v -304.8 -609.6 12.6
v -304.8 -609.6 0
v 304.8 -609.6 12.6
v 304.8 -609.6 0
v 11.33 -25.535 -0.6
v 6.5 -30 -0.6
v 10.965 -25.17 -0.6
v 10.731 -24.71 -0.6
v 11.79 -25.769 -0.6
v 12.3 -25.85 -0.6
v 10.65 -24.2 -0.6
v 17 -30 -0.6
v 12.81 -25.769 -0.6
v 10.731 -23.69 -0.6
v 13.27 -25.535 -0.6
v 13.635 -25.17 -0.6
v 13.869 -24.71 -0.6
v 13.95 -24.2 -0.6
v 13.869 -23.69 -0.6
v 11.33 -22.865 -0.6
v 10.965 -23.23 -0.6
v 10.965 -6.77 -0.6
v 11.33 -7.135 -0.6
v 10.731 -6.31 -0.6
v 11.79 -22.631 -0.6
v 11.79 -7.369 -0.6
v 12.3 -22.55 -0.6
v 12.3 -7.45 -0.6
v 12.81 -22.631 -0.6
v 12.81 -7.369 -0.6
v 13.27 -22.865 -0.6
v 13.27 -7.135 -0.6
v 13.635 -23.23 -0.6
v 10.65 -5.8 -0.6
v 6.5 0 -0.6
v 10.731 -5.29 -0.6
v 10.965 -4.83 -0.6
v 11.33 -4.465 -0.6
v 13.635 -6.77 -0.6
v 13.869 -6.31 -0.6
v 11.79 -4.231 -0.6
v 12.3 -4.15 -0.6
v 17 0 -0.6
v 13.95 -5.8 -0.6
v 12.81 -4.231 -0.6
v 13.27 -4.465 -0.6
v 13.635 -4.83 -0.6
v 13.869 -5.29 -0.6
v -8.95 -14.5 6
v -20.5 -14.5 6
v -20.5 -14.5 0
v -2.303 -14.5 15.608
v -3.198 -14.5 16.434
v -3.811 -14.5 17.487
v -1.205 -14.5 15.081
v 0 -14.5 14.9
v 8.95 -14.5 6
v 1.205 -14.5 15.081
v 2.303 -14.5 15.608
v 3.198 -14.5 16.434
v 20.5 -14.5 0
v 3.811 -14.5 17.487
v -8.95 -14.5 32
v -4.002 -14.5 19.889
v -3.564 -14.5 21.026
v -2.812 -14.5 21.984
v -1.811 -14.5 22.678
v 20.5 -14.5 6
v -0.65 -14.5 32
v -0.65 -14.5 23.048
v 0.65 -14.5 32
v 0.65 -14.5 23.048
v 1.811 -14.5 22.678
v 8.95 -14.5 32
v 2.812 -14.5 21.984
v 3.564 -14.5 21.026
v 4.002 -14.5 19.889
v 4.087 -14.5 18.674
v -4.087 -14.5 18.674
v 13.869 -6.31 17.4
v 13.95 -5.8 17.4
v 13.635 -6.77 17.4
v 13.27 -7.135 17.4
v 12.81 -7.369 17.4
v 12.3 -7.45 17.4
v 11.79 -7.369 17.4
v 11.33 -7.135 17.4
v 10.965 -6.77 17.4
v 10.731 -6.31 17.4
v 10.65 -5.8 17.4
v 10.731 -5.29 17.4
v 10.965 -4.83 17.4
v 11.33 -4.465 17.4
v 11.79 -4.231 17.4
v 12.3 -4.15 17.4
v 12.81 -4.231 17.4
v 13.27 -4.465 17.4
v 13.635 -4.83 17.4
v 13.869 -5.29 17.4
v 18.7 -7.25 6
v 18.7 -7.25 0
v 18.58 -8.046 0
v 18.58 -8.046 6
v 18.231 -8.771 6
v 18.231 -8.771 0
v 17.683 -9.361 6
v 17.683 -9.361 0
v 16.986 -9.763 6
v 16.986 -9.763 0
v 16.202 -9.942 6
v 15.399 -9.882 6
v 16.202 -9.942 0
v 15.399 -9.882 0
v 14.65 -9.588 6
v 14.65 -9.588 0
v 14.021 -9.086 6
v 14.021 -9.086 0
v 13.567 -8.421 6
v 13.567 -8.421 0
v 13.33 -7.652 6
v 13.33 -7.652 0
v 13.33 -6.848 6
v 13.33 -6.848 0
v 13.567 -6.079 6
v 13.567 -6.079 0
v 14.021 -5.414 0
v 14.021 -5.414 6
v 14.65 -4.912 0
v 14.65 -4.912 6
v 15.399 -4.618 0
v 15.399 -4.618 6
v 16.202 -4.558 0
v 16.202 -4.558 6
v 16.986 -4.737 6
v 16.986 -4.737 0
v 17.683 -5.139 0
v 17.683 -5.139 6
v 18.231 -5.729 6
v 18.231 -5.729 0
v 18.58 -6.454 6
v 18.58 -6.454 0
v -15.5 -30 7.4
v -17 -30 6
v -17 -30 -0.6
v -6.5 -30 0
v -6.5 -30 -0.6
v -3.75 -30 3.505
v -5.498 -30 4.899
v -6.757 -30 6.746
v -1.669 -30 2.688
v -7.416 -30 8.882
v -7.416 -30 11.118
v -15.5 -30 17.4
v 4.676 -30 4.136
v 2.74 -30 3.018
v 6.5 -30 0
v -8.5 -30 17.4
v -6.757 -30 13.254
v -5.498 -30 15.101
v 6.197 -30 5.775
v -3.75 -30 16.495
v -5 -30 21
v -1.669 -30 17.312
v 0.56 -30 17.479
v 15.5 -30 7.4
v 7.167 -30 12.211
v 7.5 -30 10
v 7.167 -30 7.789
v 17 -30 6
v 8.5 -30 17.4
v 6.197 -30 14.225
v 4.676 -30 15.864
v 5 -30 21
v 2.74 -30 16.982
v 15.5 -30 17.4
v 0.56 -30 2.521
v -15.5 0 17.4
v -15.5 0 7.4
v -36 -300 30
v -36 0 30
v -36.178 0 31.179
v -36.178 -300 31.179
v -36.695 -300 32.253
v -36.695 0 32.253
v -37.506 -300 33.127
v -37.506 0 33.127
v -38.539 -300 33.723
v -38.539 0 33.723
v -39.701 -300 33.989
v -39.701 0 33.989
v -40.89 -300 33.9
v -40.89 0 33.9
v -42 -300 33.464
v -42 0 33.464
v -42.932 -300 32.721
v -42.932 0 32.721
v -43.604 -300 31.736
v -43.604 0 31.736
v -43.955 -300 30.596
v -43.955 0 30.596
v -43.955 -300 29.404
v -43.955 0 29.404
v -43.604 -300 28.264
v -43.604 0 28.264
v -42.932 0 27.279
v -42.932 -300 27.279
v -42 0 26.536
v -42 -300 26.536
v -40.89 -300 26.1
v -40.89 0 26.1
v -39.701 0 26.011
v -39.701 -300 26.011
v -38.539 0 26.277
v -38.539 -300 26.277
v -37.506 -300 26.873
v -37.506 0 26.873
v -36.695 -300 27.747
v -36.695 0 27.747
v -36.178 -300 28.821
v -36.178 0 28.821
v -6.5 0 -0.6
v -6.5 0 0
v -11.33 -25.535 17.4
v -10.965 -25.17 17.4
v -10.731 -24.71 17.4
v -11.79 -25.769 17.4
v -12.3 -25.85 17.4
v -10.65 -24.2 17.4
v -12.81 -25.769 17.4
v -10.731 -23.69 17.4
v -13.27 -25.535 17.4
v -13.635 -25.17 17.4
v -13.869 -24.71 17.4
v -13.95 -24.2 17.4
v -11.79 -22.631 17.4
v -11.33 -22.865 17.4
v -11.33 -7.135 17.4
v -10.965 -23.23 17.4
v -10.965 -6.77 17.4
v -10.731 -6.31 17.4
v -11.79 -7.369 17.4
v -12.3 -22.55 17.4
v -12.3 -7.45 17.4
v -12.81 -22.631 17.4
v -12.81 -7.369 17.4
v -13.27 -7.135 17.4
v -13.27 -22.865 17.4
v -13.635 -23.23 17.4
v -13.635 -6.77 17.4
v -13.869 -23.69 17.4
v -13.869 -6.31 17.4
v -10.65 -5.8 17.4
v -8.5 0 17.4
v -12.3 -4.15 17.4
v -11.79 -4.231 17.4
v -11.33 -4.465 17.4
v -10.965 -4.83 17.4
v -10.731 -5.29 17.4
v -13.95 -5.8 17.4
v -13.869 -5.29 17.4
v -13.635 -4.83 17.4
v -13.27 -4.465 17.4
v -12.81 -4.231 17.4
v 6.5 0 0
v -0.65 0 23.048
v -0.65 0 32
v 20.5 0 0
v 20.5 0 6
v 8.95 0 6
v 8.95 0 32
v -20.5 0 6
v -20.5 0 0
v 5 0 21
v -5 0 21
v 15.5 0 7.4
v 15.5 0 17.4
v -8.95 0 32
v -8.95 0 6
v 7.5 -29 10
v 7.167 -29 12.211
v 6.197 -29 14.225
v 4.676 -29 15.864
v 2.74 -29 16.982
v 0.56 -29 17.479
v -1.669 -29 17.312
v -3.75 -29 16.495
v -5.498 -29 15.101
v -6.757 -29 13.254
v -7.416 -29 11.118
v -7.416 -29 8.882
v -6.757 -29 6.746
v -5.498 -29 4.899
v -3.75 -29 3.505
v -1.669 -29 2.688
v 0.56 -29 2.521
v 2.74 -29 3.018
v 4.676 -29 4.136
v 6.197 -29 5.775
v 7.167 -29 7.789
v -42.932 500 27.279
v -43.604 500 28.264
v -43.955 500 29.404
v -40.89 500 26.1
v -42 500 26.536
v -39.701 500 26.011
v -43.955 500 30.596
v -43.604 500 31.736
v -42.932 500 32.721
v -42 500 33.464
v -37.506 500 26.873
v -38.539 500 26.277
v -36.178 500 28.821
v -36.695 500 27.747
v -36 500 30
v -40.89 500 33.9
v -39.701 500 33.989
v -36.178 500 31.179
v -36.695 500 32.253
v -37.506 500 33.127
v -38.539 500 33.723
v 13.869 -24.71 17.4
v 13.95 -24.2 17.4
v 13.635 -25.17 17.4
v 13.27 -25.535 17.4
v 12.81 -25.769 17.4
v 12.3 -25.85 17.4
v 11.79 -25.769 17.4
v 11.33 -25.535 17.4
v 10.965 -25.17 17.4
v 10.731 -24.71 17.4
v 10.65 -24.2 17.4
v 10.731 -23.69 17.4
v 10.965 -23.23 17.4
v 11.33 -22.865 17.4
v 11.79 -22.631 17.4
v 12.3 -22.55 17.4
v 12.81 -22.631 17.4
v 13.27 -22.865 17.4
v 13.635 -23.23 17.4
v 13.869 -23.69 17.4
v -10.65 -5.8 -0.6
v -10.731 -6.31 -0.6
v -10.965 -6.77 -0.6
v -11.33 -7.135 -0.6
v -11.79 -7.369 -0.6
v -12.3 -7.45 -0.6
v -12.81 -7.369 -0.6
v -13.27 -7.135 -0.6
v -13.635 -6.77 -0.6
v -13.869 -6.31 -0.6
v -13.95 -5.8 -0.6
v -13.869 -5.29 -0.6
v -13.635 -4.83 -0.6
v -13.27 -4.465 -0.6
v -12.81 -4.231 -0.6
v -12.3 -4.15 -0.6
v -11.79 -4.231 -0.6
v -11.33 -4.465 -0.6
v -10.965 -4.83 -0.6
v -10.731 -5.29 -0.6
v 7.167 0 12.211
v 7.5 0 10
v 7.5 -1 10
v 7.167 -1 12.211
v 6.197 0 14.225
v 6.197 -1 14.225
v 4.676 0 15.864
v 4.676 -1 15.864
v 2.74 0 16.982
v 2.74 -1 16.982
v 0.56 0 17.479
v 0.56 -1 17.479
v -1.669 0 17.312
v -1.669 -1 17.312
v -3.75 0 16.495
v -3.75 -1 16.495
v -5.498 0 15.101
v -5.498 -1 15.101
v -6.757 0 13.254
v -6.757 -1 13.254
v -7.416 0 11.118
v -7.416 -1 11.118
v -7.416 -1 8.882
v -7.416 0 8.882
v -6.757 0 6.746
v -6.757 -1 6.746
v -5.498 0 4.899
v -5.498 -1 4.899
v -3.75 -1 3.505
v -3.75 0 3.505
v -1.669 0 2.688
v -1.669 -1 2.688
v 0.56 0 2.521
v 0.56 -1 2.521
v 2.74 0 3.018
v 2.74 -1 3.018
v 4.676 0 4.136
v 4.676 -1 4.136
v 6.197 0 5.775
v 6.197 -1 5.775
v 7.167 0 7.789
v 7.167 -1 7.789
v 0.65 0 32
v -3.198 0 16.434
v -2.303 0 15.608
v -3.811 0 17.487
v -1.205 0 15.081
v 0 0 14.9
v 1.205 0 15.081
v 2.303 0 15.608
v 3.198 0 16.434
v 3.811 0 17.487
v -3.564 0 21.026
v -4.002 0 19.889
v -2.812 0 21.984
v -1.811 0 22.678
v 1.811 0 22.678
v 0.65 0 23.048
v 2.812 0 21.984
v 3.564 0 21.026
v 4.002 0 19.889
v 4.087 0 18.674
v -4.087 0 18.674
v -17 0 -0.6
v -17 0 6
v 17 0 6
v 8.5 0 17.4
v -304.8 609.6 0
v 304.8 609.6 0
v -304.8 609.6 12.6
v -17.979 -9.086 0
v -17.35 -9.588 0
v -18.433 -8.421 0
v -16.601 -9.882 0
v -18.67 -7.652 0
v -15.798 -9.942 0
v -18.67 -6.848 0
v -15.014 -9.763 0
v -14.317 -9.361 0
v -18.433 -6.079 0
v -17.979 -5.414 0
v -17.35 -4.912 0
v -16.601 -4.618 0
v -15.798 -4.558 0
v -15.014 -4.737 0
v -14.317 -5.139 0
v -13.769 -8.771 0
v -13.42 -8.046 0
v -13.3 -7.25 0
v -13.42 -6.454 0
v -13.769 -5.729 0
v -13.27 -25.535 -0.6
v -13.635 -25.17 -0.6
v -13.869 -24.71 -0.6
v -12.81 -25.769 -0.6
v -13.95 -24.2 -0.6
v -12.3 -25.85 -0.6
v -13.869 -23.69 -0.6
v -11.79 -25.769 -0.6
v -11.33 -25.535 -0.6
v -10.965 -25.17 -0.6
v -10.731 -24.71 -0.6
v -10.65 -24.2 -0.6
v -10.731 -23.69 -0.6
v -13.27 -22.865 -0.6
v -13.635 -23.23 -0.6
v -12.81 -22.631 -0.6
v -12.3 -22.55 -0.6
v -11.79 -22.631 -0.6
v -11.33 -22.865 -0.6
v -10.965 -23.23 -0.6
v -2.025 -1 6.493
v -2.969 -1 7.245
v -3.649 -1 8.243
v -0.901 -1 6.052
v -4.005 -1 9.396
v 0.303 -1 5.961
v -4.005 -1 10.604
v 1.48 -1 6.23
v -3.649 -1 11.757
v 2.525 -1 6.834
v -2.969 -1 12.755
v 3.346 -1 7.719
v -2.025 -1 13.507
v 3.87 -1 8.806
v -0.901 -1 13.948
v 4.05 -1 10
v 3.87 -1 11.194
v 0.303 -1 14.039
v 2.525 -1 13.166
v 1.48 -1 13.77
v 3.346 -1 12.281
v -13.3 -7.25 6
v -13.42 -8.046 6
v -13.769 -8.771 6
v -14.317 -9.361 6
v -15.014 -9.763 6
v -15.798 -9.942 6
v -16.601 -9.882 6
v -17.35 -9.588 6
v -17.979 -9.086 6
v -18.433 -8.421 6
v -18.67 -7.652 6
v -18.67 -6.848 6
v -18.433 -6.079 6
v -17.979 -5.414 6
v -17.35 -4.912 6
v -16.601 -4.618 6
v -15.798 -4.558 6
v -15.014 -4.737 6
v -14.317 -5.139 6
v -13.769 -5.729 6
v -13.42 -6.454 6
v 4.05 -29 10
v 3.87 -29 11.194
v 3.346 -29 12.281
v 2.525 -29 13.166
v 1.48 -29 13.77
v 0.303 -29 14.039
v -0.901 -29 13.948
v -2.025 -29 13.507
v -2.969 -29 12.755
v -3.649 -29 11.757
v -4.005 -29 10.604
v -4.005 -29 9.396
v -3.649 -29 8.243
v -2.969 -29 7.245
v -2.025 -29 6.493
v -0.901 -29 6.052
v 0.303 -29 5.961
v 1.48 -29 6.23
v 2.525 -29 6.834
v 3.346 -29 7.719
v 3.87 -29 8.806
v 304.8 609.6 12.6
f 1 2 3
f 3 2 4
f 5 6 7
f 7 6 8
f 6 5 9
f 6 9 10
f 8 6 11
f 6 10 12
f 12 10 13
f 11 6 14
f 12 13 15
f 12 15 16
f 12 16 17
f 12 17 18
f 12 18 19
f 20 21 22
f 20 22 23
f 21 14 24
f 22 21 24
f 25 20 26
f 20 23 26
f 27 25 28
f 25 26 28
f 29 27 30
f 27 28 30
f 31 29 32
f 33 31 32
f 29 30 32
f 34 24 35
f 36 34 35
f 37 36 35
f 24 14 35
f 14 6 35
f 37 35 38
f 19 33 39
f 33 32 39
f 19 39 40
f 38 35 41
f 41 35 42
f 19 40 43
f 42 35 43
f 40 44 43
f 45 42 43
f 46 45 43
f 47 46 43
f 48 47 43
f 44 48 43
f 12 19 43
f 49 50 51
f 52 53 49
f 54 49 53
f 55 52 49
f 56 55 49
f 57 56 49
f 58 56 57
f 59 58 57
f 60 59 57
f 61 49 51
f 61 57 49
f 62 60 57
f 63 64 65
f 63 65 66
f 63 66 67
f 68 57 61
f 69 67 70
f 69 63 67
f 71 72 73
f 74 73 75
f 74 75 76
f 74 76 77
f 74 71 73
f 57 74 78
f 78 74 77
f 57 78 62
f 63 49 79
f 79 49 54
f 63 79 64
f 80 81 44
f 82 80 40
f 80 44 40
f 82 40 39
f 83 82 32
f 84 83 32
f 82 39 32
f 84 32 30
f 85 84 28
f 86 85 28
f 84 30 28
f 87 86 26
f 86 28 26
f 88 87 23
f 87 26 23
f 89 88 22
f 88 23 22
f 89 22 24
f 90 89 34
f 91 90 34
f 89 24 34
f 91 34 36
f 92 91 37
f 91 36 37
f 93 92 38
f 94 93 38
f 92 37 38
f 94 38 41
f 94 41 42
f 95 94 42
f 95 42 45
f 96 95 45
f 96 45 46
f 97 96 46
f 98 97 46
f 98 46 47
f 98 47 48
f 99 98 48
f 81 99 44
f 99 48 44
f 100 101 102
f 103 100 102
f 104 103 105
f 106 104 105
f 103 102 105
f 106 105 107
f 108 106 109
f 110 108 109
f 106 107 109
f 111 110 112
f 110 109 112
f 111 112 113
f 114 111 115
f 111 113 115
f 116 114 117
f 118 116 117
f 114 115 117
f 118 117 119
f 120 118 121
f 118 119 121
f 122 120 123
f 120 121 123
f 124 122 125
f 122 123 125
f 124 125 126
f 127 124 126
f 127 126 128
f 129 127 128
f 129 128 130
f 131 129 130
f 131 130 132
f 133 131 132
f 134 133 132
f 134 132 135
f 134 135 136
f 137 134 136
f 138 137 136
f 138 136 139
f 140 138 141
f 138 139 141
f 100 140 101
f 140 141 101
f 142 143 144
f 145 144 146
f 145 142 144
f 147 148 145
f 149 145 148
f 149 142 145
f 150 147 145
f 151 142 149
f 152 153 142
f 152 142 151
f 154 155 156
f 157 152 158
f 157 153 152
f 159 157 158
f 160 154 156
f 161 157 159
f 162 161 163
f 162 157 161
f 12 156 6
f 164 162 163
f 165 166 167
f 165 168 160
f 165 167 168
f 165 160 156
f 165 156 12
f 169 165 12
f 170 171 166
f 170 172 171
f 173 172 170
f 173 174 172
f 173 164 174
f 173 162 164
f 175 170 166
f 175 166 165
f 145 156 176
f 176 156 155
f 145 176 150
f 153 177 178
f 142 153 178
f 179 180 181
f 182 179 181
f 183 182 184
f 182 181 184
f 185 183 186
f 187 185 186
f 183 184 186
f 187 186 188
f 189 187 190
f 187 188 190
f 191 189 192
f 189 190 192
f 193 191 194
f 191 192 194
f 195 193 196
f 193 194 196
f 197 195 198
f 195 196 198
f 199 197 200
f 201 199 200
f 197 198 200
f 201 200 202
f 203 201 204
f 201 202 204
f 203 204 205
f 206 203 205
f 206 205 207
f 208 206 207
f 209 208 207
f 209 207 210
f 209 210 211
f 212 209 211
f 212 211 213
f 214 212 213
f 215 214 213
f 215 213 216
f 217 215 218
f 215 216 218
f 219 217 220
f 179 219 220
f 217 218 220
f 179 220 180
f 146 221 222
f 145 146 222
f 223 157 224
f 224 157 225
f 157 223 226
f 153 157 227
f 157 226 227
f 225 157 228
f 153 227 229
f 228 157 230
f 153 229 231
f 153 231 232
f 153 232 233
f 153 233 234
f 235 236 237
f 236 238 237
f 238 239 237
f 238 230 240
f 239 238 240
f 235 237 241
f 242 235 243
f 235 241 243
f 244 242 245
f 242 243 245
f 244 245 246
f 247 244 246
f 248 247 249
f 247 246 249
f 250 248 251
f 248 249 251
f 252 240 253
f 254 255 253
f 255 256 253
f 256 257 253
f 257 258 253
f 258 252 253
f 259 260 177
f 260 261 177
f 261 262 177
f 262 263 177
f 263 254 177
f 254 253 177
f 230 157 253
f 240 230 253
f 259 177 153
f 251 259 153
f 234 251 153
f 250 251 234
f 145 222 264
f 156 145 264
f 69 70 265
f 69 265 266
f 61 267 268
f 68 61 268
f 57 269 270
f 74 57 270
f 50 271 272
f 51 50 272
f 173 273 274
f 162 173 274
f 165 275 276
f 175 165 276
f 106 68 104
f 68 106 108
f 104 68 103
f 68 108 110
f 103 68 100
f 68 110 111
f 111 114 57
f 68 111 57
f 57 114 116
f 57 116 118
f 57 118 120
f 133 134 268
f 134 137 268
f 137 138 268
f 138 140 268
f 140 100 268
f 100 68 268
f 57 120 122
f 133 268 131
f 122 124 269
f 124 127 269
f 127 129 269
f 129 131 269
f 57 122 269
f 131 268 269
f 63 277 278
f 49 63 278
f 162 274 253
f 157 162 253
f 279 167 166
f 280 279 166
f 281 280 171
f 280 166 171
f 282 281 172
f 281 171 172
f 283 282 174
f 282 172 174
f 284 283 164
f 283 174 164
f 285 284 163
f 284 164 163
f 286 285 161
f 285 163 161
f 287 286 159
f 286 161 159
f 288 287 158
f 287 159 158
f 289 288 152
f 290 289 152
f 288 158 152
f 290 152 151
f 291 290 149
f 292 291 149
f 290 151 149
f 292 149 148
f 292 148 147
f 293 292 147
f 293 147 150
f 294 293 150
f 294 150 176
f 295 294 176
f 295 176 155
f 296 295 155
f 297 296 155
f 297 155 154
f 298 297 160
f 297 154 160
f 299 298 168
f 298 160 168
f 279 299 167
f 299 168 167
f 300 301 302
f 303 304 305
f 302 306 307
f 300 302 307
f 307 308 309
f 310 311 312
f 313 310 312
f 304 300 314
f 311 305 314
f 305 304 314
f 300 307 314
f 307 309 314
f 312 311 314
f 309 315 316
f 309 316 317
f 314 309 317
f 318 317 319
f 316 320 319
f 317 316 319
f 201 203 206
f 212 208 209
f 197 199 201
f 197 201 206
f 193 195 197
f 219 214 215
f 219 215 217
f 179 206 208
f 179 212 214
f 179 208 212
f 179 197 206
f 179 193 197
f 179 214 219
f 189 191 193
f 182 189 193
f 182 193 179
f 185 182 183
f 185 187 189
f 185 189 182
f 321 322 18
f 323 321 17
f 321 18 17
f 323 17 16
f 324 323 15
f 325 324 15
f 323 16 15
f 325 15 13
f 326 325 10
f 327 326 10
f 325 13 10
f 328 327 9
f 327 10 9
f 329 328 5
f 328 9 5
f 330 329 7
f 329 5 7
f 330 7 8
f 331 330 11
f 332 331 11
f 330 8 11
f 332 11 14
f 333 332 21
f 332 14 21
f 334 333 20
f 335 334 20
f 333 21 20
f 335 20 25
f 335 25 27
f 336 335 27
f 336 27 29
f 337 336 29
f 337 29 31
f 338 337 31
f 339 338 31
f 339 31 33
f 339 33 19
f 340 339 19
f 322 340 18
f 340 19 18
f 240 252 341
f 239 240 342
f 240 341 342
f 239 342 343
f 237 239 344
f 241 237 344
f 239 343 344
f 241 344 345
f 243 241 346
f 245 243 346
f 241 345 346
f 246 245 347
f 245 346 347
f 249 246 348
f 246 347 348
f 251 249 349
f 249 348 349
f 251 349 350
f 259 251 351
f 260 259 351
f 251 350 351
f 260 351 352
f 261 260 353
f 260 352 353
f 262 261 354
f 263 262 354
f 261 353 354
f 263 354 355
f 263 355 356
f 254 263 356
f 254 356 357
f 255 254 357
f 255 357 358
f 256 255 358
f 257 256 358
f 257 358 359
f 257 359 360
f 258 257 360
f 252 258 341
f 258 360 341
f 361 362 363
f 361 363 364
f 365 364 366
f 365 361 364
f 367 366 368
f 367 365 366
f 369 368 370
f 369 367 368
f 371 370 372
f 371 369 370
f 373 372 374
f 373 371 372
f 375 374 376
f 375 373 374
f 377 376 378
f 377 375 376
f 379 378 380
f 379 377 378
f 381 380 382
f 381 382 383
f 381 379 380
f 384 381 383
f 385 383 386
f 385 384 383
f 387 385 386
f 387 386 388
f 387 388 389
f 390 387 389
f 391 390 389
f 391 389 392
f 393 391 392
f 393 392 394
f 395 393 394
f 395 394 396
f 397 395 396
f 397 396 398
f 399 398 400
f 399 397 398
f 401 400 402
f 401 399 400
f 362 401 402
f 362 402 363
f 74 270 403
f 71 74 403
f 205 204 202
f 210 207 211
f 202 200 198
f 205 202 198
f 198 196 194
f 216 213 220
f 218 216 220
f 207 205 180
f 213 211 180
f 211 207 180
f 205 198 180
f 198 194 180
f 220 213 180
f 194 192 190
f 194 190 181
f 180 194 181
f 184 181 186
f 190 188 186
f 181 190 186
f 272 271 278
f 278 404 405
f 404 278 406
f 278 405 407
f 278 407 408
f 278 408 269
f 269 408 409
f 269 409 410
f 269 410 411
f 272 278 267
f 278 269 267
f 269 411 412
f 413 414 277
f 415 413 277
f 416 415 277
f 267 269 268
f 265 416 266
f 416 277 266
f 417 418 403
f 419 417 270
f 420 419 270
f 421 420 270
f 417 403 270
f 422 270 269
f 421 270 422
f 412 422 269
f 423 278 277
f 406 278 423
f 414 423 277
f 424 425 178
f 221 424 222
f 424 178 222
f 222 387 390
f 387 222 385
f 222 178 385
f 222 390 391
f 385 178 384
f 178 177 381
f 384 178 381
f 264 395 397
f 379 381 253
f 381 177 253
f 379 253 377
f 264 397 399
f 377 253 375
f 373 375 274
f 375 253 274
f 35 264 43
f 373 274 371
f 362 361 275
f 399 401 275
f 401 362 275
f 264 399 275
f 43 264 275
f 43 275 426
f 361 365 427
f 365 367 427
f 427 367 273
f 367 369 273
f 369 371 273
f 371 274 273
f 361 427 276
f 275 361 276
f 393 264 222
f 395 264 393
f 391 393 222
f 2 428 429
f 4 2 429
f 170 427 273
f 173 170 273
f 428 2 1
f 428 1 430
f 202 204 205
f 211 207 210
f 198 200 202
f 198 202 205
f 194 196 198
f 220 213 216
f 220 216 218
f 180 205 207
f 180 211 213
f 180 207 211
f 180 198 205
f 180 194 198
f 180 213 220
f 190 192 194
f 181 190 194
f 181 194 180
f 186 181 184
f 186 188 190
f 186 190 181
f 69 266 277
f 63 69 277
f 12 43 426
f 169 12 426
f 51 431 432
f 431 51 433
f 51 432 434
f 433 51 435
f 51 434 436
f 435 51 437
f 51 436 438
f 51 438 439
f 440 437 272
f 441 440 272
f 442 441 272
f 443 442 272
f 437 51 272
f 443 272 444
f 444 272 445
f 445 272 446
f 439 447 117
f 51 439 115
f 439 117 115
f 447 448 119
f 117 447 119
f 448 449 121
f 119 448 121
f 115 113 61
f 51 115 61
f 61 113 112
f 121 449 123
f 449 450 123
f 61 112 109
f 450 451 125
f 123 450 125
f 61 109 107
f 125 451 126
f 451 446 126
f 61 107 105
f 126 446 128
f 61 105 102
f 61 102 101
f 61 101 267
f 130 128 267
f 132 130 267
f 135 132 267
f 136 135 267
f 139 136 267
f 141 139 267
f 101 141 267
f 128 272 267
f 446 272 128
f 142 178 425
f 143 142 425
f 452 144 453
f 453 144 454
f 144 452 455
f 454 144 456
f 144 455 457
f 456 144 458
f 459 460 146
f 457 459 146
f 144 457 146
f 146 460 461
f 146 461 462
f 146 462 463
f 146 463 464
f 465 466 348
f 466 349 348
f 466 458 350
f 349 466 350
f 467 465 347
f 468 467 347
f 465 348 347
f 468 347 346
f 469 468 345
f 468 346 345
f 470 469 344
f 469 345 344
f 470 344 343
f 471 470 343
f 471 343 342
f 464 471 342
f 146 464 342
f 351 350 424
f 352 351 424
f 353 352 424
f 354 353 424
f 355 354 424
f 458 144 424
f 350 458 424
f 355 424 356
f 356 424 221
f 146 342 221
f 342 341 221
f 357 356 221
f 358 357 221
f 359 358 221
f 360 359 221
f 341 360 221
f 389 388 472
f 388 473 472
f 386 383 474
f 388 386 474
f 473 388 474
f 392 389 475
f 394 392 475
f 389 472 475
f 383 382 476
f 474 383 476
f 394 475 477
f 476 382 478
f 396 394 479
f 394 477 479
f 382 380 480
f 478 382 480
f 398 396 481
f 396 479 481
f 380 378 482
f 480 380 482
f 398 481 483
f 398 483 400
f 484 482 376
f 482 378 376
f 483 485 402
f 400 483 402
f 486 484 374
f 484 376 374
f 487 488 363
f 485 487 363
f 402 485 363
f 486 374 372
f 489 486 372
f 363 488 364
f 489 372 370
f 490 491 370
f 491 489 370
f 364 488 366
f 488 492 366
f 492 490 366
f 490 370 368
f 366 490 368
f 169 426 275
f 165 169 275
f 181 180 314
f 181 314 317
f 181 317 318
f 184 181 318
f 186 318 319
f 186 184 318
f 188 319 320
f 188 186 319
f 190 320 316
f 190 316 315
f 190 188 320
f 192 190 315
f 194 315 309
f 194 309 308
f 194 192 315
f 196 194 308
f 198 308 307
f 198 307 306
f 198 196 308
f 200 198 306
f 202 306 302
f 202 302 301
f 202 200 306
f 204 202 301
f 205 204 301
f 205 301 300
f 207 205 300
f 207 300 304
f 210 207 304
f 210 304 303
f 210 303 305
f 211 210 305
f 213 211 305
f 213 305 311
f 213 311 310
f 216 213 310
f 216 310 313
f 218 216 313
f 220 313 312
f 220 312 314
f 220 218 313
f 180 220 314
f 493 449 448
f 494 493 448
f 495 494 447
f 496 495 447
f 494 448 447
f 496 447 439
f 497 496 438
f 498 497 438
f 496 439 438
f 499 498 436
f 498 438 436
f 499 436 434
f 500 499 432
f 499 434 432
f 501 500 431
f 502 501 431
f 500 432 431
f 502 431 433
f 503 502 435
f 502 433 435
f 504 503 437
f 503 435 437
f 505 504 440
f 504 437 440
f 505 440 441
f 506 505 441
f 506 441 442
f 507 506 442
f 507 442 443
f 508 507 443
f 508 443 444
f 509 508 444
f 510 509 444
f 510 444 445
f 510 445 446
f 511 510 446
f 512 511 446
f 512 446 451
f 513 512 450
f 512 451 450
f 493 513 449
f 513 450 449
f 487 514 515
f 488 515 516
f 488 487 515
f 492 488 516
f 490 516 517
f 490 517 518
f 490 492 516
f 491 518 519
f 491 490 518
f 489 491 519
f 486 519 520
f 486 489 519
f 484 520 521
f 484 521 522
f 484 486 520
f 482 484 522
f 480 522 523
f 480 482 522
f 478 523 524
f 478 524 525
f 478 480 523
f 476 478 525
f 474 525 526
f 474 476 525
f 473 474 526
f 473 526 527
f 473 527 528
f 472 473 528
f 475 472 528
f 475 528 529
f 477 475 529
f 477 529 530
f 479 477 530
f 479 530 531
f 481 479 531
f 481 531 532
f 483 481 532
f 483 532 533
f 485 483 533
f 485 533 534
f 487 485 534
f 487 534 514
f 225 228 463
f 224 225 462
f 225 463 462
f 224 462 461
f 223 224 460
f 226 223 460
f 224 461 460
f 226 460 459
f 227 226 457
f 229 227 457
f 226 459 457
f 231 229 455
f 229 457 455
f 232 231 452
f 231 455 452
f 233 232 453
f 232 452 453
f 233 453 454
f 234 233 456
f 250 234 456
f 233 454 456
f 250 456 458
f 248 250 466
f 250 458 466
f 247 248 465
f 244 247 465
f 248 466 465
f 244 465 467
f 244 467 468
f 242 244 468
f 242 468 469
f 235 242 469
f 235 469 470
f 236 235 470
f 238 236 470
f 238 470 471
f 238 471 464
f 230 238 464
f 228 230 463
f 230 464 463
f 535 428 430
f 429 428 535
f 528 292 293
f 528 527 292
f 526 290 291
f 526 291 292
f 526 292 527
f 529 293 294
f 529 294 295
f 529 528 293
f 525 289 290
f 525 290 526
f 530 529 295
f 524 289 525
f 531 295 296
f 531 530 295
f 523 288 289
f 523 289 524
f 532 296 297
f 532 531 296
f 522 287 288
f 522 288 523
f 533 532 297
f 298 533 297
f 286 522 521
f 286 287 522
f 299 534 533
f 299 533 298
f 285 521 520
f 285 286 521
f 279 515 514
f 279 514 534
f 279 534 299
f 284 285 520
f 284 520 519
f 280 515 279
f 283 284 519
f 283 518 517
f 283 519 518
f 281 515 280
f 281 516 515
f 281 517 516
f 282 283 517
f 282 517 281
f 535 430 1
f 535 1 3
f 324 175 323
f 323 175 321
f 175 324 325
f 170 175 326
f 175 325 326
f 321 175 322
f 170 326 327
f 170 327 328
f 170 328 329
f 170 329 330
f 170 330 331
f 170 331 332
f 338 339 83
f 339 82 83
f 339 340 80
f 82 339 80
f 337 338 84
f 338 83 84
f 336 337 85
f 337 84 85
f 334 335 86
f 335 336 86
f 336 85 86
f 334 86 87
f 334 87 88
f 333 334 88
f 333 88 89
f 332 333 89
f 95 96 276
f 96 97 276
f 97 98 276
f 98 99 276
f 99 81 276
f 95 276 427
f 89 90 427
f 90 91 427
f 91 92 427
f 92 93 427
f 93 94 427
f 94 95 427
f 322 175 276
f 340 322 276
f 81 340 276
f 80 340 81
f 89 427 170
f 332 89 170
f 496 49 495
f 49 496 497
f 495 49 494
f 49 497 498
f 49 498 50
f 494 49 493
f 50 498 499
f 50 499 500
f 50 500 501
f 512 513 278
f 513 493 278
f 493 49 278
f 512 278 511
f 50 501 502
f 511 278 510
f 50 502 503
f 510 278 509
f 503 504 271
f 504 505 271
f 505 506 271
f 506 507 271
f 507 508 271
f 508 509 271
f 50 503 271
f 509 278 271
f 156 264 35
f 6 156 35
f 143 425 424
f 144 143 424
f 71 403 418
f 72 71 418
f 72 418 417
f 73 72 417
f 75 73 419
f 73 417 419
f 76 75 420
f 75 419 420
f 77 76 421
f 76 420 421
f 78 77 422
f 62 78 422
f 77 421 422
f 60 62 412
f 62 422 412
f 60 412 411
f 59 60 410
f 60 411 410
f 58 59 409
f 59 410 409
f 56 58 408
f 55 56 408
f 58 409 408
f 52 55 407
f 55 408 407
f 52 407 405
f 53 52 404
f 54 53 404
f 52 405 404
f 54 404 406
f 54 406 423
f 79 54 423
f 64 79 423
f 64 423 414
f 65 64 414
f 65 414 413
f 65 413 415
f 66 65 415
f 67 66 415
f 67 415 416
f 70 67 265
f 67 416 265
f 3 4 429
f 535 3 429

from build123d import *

# Parameters (mm, degrees)
F1_DEPTH  = 14.5
F2_R      = 2.7
F3_DEPTH  = 6
F4_R      = 4
F5_DEPTH  = 300
F6_DEPTH  = 500
F7_R      = 7.5
F7_R_2    = 4.05
F8_DEPTH  = 30
F9_R      = 1.65
F10_DEPTH = 18
F11_DEPTH = 1
F12_R     = 7.5
F12_R_2   = 4.05
F13_DEPTH = 1
F14_W     = 609.6
F14_H     = 1219.2
F15_DEPTH = 12.6


with BuildPart() as f1:
    # F0 (on Front) → F1 (new body)
    with BuildSketch(Plane.XZ):
        with BuildLine():
            Line((-20.5, 6), (-20.5, 0))
            Line((-20.5, 0), (0, 0))
            Line((0, 0), (20.5, 0))
            Line((20.5, 0), (20.5, 6))
            Line((20.5, 6), (8.95, 6))
            Line((8.95, 6), (8.95, 32))
            Line((8.95, 32), (0.65, 32))
            Line((0.65, 32), (0.65, 23.0481477246))
            ThreePointArc((0.65, 23.0481477246), (0, 14.9), (-0.65, 23.0481477246))
            Line((-0.65, 23.0481477246), (-0.65, 32))
            Line((-0.65, 32), (-8.95, 32))
            Line((-8.95, 32), (-8.95, 6))
            Line((-8.95, 6), (-20.5, 6))
        make_face()
    extrude(amount=F1_DEPTH)

    # F2 (on face) → F3 (cut, through all)
    with BuildSketch(Plane(origin=(0, 0, 0), x_dir=(1, 0, 0), z_dir=(0, 0, -1))):
        with Locations((-16, 7.25)):
            Circle(F2_R)
        with Locations((16, 7.25)):
            Circle(F2_R)
    extrude(amount=-F3_DEPTH, mode=Mode.SUBTRACT)


with BuildPart() as f5:
    # F4 (on Front) → F5 (new body)
    with BuildSketch(Plane.XZ):
        with Locations((-40, 30)):
            Circle(F4_R)
    extrude(amount=F5_DEPTH)


with BuildPart() as f6:
    # F4 (on Front) → F6 (new body)
    with BuildSketch(Plane.XZ):
        with Locations((-40, 30)):
            Circle(F4_R)
    extrude(amount=-F6_DEPTH)


with BuildPart() as f8:
    # F7 (on Front) → F8 (new body)
    with BuildSketch(Plane.XZ):
        Polygon((-6.5, 0), (0, 0), (6.5, 0), (6.5, -0.6), (17, -0.6), (17, 6), (15.5, 7.4), (15.5, 17.4), (8.5, 17.4), (5, 21), (0, 21), (-5, 21), (-8.5, 17.4), (-15.5, 17.4), (-15.5, 7.4), (-17, 6), (-17, -0.6), (-6.5, -0.6), align=None)
        with Locations((0, 10)):
            Circle(F7_R, mode=Mode.SUBTRACT)
        with Locations((0, 10)):
            Circle(F7_R)
        with Locations((0, 10)):
            Circle(F7_R_2, mode=Mode.SUBTRACT)
    extrude(amount=F8_DEPTH)

    # F9 (on face) → F10 (cut, through all)
    with BuildSketch(Plane(origin=(0, 0, -0.6), x_dir=(1, 0, 0), z_dir=(0, 0, -1))):
        with Locations((-12.3, 24.2)):
            Circle(F9_R)
        with Locations((-12.3, 5.8)):
            Circle(F9_R)
        with Locations((12.3, 5.8)):
            Circle(F9_R)
        with Locations((12.3, 24.2)):
            Circle(F9_R)
    extrude(amount=-F10_DEPTH, mode=Mode.SUBTRACT)

    # F7 (on Front) → F11 (cut)
    with BuildSketch(Plane.XZ):
        with Locations((0, 10)):
            Circle(F7_R)
        with Locations((0, 10)):
            Circle(F7_R_2, mode=Mode.SUBTRACT)
    extrude(amount=F11_DEPTH, mode=Mode.SUBTRACT)

    # F12 (on face) → F13 (cut)
    with BuildSketch(Plane.XZ.offset(30)):
        with Locations((0, 10)):
            Circle(F12_R)
        with Locations((0, 10)):
            Circle(F12_R_2, mode=Mode.SUBTRACT)
    extrude(amount=-F13_DEPTH, mode=Mode.SUBTRACT)


with BuildPart() as f15:
    # F14 (on Top) → F15 (new body)
    with BuildSketch(Plane.XY):
        Rectangle(F14_W, F14_H)
    extrude(amount=F15_DEPTH)


solid = Compound([f1.part, f5.part, f6.part, f8.part, f15.part])
